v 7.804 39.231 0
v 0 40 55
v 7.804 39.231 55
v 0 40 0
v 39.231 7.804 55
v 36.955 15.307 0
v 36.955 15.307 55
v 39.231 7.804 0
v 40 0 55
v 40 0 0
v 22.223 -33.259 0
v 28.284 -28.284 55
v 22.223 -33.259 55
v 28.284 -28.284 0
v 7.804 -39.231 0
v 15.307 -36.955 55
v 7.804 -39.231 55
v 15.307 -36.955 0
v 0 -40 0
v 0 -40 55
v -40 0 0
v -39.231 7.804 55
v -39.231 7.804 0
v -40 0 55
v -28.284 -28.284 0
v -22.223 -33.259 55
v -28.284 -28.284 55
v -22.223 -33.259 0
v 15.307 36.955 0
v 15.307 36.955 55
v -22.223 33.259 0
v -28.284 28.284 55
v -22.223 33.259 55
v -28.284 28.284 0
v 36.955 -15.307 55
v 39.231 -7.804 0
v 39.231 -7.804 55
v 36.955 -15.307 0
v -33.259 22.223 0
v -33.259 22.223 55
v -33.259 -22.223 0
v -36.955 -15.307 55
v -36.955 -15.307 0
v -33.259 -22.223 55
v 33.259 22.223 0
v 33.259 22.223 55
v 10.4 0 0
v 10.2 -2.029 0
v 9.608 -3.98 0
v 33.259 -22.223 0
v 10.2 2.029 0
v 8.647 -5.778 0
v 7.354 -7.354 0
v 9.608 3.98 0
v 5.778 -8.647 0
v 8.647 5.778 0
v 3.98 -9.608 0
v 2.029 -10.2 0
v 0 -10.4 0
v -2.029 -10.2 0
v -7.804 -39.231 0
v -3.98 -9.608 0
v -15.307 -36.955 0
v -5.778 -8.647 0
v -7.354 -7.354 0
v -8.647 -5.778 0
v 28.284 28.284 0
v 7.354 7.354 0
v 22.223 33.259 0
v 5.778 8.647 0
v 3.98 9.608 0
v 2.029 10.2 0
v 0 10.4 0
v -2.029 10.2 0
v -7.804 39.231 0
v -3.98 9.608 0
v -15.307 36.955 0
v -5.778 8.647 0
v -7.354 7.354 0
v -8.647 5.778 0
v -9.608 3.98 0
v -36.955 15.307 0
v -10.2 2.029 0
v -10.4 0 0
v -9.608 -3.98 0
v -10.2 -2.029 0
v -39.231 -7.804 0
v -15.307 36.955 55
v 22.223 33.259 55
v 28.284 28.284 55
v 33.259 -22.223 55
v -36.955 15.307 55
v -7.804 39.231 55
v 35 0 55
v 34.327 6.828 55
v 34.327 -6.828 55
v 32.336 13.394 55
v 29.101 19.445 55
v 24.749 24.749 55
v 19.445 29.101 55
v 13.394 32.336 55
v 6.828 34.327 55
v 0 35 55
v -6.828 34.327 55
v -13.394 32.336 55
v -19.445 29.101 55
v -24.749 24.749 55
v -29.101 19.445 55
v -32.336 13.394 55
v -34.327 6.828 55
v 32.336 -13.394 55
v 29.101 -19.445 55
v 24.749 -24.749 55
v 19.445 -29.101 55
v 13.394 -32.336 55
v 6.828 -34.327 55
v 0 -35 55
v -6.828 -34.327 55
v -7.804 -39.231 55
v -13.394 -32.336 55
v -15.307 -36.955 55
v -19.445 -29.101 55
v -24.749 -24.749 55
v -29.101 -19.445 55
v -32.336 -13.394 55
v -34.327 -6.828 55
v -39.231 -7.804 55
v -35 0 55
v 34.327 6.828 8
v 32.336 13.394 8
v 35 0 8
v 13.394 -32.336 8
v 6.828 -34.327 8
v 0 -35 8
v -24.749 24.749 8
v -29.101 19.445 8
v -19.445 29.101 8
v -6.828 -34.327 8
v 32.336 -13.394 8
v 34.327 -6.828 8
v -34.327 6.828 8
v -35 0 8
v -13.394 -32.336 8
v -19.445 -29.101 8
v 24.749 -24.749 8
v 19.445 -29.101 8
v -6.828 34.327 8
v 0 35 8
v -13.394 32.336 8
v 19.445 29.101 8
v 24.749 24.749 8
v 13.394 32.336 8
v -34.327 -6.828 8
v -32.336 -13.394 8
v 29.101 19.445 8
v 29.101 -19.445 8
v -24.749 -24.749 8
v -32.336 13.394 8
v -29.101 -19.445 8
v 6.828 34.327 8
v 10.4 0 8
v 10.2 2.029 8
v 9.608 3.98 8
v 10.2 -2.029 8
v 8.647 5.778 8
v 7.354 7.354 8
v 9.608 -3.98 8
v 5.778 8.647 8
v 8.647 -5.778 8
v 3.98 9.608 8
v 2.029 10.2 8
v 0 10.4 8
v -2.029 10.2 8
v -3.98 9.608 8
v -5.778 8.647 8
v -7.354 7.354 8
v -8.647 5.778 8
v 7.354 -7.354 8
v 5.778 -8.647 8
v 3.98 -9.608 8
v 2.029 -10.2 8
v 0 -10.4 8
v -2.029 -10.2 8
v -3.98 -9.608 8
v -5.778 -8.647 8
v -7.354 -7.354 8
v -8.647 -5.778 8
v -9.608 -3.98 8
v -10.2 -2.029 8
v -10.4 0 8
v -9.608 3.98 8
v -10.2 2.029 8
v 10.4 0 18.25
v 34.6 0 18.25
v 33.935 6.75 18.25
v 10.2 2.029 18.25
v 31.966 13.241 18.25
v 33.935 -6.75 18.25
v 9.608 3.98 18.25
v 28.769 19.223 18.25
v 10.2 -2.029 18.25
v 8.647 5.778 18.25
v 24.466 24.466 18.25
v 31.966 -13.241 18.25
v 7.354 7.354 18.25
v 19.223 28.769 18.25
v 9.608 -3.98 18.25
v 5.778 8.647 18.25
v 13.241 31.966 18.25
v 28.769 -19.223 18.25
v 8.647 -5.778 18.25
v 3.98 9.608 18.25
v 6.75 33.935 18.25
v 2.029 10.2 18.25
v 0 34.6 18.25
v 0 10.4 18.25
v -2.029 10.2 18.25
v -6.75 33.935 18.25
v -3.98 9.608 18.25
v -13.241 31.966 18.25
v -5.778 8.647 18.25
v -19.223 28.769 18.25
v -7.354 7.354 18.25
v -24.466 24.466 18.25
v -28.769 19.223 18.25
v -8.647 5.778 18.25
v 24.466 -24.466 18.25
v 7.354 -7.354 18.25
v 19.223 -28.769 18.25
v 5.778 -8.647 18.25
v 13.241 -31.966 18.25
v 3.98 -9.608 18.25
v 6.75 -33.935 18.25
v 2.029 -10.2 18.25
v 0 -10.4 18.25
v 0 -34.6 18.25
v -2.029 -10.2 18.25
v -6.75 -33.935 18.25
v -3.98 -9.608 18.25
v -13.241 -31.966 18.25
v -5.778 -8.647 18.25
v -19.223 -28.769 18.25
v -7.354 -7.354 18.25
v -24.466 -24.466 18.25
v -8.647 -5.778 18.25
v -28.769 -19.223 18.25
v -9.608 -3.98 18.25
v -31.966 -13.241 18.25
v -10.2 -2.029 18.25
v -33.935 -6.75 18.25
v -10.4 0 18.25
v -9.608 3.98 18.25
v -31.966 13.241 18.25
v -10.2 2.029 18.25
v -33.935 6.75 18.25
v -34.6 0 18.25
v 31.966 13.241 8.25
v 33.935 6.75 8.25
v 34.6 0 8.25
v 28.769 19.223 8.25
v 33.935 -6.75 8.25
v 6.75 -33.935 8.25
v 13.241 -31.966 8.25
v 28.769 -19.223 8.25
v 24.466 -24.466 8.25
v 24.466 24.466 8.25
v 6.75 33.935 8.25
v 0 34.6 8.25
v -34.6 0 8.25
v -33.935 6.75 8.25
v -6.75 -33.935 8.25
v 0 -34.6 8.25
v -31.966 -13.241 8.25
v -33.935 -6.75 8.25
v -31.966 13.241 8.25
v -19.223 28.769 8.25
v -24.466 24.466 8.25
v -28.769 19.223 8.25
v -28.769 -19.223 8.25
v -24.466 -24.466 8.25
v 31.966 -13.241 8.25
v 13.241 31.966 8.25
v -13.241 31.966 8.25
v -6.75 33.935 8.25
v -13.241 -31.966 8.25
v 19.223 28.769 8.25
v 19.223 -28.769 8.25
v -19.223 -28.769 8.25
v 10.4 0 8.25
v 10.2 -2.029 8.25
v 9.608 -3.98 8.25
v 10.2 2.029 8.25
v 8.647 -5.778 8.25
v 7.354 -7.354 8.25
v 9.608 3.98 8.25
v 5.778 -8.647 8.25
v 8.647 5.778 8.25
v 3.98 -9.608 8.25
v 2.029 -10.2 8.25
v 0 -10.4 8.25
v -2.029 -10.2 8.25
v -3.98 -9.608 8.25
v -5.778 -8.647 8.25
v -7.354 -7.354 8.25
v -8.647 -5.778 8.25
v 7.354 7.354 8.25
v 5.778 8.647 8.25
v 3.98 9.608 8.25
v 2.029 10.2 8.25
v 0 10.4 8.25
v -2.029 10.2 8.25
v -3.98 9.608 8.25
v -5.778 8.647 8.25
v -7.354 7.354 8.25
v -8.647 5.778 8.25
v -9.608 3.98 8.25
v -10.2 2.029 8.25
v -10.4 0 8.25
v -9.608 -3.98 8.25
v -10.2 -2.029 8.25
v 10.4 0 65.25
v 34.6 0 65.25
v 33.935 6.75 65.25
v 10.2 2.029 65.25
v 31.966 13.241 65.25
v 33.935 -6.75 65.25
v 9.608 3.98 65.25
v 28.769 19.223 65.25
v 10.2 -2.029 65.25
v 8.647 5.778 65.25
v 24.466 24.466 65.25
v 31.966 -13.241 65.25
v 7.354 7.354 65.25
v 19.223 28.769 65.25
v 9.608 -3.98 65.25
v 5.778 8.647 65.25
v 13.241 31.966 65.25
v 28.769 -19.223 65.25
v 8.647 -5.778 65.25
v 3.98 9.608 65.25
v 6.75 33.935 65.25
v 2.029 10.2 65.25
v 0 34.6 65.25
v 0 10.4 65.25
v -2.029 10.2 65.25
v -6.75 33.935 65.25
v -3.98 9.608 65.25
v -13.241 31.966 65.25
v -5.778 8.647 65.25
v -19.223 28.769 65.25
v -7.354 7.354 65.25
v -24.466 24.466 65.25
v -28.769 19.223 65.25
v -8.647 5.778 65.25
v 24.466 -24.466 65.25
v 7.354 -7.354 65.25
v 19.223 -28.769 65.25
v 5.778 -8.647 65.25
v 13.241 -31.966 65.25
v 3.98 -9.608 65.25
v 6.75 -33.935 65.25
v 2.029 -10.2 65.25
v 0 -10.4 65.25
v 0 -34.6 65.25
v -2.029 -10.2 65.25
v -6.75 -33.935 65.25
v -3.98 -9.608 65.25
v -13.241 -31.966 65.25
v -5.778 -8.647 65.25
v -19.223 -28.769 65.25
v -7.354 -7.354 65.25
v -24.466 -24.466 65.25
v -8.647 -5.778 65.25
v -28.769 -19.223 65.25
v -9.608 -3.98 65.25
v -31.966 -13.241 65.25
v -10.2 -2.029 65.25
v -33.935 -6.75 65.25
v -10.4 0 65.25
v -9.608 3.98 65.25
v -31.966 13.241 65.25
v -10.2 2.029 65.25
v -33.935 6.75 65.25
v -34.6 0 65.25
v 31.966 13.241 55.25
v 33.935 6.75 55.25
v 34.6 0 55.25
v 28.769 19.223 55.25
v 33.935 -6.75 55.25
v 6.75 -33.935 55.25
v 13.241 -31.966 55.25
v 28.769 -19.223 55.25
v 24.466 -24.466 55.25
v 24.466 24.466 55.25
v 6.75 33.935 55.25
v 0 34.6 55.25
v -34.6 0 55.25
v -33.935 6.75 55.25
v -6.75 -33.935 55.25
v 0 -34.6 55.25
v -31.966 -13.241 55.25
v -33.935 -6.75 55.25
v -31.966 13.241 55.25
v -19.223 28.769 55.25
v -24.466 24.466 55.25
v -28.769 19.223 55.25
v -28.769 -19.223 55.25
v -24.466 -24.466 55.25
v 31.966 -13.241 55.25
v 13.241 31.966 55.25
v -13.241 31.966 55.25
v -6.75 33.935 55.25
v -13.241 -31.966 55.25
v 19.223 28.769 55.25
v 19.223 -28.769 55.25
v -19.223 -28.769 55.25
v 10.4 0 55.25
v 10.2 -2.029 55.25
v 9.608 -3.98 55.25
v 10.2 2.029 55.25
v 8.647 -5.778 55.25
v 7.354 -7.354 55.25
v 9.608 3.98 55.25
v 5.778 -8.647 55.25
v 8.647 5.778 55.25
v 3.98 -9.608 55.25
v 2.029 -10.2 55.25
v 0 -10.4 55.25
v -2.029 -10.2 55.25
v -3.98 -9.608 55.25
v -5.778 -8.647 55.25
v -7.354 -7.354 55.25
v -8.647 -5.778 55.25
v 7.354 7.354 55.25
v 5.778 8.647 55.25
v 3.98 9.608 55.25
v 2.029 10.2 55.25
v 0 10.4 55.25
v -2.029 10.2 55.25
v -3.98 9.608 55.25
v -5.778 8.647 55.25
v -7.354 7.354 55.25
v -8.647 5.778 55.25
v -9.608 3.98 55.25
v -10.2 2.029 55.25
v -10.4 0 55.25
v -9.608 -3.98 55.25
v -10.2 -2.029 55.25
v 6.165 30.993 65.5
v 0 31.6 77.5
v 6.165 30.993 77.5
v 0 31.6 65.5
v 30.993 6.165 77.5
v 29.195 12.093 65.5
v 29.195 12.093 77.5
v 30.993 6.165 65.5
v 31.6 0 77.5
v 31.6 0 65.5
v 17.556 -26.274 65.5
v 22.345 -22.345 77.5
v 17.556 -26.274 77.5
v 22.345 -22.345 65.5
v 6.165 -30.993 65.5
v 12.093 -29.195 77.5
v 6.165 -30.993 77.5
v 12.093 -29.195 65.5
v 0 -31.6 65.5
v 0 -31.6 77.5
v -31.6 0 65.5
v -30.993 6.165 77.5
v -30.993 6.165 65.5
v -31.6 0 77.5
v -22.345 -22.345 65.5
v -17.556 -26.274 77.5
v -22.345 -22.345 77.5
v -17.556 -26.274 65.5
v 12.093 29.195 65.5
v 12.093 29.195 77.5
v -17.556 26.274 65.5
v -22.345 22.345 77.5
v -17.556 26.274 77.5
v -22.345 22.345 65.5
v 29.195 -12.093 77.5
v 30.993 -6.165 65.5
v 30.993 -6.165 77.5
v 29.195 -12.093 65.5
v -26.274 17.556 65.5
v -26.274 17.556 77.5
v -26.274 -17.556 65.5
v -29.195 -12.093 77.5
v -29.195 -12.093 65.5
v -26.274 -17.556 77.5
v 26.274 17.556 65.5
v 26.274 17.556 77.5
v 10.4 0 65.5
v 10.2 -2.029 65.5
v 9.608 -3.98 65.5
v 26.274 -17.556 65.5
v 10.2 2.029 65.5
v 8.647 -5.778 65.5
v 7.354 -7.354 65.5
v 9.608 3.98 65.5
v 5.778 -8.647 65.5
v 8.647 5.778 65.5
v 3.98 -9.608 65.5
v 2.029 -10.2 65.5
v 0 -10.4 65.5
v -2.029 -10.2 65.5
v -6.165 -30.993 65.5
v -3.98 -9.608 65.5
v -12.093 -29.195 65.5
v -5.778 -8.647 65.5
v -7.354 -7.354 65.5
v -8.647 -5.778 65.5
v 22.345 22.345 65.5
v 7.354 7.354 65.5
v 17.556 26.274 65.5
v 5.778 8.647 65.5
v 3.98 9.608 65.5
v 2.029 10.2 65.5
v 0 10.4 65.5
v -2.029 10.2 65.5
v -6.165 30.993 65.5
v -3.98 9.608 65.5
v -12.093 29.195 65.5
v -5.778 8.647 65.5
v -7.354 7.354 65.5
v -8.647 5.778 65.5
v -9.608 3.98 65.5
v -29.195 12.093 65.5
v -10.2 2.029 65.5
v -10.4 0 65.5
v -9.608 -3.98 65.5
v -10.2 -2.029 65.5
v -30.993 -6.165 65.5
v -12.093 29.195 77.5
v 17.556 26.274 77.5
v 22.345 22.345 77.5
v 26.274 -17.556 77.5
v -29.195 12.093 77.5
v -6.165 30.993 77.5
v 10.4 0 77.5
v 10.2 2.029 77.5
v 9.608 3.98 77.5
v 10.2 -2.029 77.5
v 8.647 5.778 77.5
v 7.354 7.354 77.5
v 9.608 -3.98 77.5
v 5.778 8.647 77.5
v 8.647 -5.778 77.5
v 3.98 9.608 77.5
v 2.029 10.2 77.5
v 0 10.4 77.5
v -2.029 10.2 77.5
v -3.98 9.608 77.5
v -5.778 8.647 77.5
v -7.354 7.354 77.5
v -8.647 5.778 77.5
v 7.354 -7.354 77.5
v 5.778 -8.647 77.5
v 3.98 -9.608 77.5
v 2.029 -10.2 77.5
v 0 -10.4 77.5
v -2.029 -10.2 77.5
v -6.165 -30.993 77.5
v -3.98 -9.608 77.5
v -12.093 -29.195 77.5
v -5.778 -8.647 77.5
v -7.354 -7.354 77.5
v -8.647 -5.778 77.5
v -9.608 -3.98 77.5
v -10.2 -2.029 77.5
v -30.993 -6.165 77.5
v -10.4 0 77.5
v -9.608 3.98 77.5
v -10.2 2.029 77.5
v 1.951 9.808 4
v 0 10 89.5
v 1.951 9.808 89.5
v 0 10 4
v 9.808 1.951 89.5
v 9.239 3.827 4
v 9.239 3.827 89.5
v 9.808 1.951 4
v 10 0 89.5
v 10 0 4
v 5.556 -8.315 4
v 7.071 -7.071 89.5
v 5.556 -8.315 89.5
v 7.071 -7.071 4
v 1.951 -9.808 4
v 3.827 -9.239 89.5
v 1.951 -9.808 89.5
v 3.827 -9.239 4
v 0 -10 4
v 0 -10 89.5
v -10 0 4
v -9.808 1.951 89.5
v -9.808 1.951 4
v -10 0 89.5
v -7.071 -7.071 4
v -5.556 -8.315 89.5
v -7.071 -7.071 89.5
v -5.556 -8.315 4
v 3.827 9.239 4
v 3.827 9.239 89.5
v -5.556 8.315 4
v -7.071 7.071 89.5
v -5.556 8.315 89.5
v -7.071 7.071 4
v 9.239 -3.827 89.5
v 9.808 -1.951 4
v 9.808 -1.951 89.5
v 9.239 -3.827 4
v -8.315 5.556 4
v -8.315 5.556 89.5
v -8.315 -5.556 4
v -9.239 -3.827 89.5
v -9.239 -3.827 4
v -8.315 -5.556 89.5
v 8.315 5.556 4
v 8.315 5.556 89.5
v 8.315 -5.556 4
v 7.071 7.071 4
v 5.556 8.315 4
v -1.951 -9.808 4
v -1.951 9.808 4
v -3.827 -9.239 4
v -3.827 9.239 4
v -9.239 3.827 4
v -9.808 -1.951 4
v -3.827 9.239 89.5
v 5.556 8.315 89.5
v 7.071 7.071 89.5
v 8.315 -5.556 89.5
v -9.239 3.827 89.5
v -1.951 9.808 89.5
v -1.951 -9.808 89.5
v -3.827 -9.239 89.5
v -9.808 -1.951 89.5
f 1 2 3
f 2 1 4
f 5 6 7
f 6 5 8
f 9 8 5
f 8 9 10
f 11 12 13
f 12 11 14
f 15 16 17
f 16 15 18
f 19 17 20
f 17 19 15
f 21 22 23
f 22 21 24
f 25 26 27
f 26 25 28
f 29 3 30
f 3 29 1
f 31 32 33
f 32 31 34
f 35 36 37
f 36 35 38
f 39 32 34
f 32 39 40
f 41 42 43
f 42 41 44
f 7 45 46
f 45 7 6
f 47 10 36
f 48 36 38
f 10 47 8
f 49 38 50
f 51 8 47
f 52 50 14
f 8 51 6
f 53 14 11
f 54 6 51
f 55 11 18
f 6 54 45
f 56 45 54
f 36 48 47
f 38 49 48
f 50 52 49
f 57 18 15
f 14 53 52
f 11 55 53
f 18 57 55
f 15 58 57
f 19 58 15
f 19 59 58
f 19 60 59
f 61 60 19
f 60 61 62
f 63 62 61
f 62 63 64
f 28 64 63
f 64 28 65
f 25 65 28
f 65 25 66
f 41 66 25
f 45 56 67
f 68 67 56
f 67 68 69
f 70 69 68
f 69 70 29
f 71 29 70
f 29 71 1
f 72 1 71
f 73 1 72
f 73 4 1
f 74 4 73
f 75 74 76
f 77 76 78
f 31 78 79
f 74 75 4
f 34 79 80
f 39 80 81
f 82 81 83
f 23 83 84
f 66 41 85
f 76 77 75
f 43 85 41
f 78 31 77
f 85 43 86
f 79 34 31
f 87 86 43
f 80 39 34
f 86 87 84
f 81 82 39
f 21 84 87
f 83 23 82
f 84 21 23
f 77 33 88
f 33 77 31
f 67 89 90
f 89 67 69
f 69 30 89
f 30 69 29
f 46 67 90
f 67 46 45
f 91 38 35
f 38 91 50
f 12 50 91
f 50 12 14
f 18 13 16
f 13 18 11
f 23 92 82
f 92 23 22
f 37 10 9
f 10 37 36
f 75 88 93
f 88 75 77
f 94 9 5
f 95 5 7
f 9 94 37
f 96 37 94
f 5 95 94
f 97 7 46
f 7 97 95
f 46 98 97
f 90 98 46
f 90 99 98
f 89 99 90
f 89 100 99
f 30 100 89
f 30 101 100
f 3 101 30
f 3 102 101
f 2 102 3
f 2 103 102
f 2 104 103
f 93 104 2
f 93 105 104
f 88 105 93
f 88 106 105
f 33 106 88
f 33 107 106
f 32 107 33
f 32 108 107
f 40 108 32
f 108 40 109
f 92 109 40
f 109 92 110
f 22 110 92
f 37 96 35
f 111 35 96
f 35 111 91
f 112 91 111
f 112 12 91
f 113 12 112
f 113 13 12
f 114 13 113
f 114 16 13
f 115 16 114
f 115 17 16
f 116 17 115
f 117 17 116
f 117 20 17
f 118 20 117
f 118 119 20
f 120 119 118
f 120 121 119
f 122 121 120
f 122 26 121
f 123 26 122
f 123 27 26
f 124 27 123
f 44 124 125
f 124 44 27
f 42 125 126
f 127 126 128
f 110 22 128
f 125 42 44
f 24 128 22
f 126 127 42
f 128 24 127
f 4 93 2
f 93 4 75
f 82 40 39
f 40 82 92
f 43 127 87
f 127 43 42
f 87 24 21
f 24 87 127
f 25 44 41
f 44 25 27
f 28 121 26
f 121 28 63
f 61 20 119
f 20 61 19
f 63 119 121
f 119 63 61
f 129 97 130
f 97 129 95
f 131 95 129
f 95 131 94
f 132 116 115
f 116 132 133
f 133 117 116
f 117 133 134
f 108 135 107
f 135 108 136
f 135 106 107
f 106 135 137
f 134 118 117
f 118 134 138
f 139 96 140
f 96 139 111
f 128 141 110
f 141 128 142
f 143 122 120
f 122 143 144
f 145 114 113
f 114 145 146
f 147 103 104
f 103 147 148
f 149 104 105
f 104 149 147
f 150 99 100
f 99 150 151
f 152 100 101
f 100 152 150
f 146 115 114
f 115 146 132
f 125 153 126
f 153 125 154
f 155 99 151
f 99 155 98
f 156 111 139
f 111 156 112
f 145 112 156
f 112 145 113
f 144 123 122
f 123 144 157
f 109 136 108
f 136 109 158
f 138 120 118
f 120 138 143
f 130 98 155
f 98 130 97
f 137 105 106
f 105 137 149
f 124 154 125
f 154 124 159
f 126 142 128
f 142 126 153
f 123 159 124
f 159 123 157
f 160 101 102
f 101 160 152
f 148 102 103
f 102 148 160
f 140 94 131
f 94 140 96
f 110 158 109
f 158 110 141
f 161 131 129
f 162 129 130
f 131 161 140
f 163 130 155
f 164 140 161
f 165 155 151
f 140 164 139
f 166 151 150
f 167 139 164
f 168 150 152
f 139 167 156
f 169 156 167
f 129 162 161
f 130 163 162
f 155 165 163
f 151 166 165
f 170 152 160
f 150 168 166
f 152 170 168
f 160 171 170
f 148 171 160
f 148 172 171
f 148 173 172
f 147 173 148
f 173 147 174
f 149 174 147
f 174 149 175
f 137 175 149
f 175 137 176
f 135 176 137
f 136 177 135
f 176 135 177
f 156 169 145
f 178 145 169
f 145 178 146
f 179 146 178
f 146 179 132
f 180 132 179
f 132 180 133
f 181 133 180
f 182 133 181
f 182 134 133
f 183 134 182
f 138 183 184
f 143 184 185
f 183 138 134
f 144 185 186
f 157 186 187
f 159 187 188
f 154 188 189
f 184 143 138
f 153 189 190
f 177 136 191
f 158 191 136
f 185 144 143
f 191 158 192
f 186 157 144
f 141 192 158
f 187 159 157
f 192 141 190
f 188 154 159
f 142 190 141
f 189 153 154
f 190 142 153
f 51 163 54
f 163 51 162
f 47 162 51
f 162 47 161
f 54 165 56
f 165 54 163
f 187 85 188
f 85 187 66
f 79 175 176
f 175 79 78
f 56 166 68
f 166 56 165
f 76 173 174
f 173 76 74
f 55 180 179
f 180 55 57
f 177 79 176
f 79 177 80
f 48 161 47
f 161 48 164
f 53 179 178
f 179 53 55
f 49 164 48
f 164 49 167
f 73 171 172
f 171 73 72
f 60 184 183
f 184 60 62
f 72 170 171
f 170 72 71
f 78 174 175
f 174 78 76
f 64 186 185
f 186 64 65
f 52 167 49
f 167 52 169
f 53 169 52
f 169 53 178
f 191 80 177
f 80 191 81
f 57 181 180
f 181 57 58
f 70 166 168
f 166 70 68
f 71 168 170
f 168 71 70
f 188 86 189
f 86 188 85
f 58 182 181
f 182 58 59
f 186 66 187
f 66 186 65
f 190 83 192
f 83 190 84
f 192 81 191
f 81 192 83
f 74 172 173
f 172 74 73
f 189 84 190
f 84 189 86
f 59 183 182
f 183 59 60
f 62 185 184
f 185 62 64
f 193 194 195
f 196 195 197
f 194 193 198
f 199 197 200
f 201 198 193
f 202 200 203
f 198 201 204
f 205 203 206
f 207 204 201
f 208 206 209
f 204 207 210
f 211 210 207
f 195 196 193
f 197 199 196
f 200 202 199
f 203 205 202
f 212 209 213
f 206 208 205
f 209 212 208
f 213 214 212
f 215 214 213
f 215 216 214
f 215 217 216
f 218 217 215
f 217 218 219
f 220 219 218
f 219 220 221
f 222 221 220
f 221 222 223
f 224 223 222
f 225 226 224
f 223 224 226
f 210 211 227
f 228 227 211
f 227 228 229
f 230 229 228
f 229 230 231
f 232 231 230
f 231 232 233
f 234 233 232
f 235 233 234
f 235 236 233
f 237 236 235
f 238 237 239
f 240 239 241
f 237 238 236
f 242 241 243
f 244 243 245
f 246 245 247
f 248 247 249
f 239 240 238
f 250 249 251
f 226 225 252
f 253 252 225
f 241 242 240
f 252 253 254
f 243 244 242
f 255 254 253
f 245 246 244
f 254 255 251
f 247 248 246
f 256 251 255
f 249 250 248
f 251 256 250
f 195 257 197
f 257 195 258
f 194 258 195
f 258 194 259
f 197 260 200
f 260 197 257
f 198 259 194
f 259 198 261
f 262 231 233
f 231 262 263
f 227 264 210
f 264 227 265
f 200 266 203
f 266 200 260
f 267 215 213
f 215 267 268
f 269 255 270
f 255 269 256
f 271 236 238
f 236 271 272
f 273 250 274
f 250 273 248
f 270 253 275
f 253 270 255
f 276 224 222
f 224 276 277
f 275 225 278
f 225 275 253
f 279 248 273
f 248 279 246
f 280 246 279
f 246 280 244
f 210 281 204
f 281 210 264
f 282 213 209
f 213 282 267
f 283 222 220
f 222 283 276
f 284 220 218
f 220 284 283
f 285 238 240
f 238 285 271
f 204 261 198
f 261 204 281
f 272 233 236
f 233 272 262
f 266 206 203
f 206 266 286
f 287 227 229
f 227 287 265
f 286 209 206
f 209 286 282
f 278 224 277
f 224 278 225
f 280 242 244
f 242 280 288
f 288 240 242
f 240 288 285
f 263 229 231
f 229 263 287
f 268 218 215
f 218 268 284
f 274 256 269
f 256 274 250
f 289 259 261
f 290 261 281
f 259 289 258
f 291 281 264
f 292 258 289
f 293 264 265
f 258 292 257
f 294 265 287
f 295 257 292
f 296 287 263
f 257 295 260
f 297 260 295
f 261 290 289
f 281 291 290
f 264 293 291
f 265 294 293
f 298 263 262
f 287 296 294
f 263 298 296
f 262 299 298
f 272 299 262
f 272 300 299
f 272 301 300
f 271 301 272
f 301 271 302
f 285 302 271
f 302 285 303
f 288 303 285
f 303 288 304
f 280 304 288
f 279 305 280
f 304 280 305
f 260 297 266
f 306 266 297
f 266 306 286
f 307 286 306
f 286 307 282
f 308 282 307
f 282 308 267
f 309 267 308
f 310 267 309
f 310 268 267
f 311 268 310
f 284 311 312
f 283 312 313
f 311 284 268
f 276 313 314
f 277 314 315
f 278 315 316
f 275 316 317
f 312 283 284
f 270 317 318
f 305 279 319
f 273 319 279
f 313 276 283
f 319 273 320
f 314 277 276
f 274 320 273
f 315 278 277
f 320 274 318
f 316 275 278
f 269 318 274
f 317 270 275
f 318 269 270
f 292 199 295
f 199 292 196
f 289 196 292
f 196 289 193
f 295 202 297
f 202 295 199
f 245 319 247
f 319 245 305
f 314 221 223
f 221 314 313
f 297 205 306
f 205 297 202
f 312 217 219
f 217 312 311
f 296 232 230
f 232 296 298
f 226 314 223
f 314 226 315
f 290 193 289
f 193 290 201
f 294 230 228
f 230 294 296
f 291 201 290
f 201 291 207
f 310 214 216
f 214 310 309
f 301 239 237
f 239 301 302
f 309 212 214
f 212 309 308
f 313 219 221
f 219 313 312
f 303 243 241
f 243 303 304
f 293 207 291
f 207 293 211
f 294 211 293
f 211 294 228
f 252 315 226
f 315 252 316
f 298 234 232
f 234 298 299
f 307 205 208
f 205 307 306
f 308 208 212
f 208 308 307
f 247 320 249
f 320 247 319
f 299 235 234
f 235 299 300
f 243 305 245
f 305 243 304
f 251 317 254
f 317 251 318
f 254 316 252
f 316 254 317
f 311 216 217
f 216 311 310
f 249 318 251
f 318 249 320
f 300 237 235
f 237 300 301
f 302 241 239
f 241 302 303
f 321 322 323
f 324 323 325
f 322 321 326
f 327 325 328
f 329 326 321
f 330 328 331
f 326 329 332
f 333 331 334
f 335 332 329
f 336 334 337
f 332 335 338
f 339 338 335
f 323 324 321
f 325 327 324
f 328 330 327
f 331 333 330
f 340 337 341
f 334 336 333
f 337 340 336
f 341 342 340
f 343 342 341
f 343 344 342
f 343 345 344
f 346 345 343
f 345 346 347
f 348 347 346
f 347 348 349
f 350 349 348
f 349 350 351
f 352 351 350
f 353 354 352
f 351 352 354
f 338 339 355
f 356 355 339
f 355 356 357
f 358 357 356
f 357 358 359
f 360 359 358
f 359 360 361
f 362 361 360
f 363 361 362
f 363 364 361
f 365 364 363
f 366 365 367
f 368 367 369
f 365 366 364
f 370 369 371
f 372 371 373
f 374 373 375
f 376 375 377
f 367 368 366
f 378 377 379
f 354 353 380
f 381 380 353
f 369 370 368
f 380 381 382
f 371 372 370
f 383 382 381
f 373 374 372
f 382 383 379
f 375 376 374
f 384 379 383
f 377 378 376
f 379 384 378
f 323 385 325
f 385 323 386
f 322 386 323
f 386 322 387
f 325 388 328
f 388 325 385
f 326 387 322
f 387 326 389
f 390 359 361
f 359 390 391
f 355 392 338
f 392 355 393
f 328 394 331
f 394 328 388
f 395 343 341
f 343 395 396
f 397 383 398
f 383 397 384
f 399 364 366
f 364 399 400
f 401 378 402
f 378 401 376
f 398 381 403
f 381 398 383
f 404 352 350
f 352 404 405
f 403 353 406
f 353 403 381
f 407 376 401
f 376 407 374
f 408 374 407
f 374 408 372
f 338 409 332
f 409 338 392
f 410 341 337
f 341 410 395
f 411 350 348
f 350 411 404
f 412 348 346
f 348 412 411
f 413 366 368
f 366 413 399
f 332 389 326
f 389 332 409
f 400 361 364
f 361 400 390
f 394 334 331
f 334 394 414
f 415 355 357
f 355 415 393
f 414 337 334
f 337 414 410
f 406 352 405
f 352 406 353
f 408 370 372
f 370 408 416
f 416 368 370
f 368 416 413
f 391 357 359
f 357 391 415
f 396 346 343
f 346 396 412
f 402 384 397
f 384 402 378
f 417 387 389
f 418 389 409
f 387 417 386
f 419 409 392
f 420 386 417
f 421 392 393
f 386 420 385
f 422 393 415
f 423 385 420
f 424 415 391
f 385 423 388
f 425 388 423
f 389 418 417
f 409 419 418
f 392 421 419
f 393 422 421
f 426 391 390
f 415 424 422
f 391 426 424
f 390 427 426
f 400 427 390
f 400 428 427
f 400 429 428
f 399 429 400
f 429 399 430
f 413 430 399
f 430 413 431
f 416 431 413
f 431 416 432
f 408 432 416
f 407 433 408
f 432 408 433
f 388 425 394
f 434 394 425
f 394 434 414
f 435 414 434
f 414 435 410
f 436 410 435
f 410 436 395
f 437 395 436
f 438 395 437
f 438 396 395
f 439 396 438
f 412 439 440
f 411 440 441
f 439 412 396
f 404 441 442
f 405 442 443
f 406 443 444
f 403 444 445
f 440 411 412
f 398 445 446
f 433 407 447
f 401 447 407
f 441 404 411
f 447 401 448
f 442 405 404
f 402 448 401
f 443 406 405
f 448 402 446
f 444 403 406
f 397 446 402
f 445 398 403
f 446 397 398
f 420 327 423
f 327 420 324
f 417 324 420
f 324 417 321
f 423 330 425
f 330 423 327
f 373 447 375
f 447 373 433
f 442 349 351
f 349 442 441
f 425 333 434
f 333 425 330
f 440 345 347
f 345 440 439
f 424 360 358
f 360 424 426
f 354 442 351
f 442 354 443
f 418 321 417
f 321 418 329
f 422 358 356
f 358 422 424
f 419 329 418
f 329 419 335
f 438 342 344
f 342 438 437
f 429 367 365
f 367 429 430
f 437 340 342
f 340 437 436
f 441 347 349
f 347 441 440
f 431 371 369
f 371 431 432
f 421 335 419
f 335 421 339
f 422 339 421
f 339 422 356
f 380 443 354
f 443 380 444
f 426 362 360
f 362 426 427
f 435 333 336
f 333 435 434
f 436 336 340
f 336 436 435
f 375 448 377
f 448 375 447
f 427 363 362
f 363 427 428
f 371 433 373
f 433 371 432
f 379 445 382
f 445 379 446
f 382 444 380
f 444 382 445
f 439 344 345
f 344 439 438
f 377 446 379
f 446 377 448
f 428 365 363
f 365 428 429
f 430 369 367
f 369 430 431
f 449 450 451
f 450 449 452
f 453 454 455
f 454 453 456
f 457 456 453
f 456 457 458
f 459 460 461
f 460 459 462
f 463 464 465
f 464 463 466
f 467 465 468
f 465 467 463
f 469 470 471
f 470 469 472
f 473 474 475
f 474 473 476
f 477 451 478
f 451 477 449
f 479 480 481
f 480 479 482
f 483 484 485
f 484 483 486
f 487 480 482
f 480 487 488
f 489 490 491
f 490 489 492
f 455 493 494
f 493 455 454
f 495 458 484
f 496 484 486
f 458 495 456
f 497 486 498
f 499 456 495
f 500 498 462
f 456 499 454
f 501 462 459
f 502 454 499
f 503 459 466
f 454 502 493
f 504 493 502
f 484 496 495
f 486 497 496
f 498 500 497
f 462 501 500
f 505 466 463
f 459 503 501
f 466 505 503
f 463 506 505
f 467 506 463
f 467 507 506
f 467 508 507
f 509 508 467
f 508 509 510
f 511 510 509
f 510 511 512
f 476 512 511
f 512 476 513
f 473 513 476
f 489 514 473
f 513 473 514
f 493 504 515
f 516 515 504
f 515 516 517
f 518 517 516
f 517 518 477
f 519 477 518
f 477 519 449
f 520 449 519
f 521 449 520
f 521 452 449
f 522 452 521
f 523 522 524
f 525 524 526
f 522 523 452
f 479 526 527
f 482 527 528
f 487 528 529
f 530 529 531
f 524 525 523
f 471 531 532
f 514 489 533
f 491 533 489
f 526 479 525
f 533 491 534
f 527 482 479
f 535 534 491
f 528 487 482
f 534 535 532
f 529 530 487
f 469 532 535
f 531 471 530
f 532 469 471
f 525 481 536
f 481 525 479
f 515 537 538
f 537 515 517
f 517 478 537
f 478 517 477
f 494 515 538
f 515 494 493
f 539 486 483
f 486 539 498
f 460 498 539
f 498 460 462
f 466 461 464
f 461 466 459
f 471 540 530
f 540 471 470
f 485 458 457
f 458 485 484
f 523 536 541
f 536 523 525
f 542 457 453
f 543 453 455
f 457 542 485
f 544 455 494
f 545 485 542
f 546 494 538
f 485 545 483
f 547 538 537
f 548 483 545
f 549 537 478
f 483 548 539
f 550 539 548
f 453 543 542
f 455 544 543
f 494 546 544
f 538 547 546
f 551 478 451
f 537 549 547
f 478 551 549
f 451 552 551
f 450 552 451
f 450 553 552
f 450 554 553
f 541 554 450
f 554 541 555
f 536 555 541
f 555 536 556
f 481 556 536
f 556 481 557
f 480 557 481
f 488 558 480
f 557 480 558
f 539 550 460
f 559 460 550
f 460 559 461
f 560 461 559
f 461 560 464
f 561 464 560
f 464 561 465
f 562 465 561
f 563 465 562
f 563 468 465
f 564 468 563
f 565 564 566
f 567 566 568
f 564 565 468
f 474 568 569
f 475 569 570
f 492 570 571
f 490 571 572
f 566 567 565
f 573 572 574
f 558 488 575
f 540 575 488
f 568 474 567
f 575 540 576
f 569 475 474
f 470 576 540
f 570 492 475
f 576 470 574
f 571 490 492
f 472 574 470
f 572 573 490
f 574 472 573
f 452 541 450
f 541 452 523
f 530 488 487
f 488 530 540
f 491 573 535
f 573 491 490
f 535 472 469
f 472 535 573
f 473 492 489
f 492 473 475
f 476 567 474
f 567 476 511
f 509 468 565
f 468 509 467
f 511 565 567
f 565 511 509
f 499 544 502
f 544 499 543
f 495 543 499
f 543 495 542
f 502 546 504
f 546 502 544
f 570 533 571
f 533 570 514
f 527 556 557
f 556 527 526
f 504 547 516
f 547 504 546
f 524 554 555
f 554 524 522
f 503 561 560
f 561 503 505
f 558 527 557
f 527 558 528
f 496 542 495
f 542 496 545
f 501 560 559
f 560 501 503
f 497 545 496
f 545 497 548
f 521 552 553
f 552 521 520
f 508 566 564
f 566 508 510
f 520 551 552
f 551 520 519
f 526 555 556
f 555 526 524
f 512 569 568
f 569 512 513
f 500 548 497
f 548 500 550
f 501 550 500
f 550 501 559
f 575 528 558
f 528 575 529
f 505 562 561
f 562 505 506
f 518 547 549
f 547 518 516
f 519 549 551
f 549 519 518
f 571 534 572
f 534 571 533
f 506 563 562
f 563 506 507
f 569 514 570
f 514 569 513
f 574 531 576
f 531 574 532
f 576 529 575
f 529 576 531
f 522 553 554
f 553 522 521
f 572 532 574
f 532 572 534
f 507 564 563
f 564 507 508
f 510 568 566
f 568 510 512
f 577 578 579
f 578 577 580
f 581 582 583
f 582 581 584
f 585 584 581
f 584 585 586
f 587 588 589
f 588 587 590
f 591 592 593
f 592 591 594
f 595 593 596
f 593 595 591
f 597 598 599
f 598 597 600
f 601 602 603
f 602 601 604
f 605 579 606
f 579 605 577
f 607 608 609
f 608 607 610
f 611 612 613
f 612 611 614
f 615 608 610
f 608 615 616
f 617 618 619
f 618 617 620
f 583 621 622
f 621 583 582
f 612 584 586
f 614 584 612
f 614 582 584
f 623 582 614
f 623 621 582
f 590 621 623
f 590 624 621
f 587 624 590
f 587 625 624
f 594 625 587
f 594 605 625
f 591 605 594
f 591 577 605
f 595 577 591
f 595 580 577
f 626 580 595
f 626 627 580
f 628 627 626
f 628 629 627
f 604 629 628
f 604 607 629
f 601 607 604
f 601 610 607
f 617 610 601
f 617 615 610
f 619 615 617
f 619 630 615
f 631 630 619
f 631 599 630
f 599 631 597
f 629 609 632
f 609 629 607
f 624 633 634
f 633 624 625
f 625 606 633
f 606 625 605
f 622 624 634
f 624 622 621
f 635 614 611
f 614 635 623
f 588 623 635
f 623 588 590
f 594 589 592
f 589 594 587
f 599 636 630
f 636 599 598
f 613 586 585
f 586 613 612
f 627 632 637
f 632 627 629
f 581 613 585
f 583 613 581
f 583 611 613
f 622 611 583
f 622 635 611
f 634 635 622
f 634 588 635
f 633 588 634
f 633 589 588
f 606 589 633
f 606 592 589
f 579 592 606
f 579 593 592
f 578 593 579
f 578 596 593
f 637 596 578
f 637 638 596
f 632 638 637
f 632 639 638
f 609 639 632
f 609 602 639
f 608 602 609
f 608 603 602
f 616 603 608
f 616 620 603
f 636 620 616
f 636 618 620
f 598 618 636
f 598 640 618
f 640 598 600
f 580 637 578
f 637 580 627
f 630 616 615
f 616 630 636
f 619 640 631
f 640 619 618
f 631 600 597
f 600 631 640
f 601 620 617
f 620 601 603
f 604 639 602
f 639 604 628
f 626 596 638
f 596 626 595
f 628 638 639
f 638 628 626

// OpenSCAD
$fn = 32;

// ------------------------------------------------------------------------
// Bearing housing: housing d80, two bearings and a shaft
// Every part is its own module, assembly() places them once.
// ------------------------------------------------------------------------

// --- part 1 ---
module housing() {
  difference() {
    cylinder(h = 55, d = 80);
    translate([0, 0, 8]) cylinder(h = 48, d = 70);
    translate([0, 0, -1]) cylinder(h = 10, d = 20.8);
  }
}

// --- part 2 ---
module bearing_lower() {
  difference() {
      translate([0, 0, 0]) cylinder(h = 10, d = 69.2);
      translate([0, 0, -1]) cylinder(h = 12, d = 20.8);
    }
}

// --- part 3 ---
module bearing_upper() {
  difference() {
      translate([0, 0, 0]) cylinder(h = 10, d = 69.2);
      translate([0, 0, -1]) cylinder(h = 12, d = 20.8);
    }
}

// --- part 4 ---
module spacer() {
  difference() {
      translate([0, 0, 0]) cylinder(h = 12, d = 63.2);
      translate([0, 0, -1]) cylinder(h = 14, d = 20.8);
    }
}

// --- part 5 ---
module shaft() {
  translate([0, 0, -42.75]) cylinder(h = 85.5, d = 20);
}

// --- assembly ---
module assembly() {
  translate([0, 0, 0]) rotate([0, 0, 0]) housing();
  translate([0, 0, 8.25]) rotate([0, 0, 0]) bearing_lower();
  translate([0, 0, 55.25]) rotate([0, 0, 0]) bearing_upper();
  translate([0, 0, 65.5]) rotate([0, 0, 0]) spacer();
  translate([0, 0, 46.75]) rotate([0, 0, 0]) shaft();
}

assembly();
